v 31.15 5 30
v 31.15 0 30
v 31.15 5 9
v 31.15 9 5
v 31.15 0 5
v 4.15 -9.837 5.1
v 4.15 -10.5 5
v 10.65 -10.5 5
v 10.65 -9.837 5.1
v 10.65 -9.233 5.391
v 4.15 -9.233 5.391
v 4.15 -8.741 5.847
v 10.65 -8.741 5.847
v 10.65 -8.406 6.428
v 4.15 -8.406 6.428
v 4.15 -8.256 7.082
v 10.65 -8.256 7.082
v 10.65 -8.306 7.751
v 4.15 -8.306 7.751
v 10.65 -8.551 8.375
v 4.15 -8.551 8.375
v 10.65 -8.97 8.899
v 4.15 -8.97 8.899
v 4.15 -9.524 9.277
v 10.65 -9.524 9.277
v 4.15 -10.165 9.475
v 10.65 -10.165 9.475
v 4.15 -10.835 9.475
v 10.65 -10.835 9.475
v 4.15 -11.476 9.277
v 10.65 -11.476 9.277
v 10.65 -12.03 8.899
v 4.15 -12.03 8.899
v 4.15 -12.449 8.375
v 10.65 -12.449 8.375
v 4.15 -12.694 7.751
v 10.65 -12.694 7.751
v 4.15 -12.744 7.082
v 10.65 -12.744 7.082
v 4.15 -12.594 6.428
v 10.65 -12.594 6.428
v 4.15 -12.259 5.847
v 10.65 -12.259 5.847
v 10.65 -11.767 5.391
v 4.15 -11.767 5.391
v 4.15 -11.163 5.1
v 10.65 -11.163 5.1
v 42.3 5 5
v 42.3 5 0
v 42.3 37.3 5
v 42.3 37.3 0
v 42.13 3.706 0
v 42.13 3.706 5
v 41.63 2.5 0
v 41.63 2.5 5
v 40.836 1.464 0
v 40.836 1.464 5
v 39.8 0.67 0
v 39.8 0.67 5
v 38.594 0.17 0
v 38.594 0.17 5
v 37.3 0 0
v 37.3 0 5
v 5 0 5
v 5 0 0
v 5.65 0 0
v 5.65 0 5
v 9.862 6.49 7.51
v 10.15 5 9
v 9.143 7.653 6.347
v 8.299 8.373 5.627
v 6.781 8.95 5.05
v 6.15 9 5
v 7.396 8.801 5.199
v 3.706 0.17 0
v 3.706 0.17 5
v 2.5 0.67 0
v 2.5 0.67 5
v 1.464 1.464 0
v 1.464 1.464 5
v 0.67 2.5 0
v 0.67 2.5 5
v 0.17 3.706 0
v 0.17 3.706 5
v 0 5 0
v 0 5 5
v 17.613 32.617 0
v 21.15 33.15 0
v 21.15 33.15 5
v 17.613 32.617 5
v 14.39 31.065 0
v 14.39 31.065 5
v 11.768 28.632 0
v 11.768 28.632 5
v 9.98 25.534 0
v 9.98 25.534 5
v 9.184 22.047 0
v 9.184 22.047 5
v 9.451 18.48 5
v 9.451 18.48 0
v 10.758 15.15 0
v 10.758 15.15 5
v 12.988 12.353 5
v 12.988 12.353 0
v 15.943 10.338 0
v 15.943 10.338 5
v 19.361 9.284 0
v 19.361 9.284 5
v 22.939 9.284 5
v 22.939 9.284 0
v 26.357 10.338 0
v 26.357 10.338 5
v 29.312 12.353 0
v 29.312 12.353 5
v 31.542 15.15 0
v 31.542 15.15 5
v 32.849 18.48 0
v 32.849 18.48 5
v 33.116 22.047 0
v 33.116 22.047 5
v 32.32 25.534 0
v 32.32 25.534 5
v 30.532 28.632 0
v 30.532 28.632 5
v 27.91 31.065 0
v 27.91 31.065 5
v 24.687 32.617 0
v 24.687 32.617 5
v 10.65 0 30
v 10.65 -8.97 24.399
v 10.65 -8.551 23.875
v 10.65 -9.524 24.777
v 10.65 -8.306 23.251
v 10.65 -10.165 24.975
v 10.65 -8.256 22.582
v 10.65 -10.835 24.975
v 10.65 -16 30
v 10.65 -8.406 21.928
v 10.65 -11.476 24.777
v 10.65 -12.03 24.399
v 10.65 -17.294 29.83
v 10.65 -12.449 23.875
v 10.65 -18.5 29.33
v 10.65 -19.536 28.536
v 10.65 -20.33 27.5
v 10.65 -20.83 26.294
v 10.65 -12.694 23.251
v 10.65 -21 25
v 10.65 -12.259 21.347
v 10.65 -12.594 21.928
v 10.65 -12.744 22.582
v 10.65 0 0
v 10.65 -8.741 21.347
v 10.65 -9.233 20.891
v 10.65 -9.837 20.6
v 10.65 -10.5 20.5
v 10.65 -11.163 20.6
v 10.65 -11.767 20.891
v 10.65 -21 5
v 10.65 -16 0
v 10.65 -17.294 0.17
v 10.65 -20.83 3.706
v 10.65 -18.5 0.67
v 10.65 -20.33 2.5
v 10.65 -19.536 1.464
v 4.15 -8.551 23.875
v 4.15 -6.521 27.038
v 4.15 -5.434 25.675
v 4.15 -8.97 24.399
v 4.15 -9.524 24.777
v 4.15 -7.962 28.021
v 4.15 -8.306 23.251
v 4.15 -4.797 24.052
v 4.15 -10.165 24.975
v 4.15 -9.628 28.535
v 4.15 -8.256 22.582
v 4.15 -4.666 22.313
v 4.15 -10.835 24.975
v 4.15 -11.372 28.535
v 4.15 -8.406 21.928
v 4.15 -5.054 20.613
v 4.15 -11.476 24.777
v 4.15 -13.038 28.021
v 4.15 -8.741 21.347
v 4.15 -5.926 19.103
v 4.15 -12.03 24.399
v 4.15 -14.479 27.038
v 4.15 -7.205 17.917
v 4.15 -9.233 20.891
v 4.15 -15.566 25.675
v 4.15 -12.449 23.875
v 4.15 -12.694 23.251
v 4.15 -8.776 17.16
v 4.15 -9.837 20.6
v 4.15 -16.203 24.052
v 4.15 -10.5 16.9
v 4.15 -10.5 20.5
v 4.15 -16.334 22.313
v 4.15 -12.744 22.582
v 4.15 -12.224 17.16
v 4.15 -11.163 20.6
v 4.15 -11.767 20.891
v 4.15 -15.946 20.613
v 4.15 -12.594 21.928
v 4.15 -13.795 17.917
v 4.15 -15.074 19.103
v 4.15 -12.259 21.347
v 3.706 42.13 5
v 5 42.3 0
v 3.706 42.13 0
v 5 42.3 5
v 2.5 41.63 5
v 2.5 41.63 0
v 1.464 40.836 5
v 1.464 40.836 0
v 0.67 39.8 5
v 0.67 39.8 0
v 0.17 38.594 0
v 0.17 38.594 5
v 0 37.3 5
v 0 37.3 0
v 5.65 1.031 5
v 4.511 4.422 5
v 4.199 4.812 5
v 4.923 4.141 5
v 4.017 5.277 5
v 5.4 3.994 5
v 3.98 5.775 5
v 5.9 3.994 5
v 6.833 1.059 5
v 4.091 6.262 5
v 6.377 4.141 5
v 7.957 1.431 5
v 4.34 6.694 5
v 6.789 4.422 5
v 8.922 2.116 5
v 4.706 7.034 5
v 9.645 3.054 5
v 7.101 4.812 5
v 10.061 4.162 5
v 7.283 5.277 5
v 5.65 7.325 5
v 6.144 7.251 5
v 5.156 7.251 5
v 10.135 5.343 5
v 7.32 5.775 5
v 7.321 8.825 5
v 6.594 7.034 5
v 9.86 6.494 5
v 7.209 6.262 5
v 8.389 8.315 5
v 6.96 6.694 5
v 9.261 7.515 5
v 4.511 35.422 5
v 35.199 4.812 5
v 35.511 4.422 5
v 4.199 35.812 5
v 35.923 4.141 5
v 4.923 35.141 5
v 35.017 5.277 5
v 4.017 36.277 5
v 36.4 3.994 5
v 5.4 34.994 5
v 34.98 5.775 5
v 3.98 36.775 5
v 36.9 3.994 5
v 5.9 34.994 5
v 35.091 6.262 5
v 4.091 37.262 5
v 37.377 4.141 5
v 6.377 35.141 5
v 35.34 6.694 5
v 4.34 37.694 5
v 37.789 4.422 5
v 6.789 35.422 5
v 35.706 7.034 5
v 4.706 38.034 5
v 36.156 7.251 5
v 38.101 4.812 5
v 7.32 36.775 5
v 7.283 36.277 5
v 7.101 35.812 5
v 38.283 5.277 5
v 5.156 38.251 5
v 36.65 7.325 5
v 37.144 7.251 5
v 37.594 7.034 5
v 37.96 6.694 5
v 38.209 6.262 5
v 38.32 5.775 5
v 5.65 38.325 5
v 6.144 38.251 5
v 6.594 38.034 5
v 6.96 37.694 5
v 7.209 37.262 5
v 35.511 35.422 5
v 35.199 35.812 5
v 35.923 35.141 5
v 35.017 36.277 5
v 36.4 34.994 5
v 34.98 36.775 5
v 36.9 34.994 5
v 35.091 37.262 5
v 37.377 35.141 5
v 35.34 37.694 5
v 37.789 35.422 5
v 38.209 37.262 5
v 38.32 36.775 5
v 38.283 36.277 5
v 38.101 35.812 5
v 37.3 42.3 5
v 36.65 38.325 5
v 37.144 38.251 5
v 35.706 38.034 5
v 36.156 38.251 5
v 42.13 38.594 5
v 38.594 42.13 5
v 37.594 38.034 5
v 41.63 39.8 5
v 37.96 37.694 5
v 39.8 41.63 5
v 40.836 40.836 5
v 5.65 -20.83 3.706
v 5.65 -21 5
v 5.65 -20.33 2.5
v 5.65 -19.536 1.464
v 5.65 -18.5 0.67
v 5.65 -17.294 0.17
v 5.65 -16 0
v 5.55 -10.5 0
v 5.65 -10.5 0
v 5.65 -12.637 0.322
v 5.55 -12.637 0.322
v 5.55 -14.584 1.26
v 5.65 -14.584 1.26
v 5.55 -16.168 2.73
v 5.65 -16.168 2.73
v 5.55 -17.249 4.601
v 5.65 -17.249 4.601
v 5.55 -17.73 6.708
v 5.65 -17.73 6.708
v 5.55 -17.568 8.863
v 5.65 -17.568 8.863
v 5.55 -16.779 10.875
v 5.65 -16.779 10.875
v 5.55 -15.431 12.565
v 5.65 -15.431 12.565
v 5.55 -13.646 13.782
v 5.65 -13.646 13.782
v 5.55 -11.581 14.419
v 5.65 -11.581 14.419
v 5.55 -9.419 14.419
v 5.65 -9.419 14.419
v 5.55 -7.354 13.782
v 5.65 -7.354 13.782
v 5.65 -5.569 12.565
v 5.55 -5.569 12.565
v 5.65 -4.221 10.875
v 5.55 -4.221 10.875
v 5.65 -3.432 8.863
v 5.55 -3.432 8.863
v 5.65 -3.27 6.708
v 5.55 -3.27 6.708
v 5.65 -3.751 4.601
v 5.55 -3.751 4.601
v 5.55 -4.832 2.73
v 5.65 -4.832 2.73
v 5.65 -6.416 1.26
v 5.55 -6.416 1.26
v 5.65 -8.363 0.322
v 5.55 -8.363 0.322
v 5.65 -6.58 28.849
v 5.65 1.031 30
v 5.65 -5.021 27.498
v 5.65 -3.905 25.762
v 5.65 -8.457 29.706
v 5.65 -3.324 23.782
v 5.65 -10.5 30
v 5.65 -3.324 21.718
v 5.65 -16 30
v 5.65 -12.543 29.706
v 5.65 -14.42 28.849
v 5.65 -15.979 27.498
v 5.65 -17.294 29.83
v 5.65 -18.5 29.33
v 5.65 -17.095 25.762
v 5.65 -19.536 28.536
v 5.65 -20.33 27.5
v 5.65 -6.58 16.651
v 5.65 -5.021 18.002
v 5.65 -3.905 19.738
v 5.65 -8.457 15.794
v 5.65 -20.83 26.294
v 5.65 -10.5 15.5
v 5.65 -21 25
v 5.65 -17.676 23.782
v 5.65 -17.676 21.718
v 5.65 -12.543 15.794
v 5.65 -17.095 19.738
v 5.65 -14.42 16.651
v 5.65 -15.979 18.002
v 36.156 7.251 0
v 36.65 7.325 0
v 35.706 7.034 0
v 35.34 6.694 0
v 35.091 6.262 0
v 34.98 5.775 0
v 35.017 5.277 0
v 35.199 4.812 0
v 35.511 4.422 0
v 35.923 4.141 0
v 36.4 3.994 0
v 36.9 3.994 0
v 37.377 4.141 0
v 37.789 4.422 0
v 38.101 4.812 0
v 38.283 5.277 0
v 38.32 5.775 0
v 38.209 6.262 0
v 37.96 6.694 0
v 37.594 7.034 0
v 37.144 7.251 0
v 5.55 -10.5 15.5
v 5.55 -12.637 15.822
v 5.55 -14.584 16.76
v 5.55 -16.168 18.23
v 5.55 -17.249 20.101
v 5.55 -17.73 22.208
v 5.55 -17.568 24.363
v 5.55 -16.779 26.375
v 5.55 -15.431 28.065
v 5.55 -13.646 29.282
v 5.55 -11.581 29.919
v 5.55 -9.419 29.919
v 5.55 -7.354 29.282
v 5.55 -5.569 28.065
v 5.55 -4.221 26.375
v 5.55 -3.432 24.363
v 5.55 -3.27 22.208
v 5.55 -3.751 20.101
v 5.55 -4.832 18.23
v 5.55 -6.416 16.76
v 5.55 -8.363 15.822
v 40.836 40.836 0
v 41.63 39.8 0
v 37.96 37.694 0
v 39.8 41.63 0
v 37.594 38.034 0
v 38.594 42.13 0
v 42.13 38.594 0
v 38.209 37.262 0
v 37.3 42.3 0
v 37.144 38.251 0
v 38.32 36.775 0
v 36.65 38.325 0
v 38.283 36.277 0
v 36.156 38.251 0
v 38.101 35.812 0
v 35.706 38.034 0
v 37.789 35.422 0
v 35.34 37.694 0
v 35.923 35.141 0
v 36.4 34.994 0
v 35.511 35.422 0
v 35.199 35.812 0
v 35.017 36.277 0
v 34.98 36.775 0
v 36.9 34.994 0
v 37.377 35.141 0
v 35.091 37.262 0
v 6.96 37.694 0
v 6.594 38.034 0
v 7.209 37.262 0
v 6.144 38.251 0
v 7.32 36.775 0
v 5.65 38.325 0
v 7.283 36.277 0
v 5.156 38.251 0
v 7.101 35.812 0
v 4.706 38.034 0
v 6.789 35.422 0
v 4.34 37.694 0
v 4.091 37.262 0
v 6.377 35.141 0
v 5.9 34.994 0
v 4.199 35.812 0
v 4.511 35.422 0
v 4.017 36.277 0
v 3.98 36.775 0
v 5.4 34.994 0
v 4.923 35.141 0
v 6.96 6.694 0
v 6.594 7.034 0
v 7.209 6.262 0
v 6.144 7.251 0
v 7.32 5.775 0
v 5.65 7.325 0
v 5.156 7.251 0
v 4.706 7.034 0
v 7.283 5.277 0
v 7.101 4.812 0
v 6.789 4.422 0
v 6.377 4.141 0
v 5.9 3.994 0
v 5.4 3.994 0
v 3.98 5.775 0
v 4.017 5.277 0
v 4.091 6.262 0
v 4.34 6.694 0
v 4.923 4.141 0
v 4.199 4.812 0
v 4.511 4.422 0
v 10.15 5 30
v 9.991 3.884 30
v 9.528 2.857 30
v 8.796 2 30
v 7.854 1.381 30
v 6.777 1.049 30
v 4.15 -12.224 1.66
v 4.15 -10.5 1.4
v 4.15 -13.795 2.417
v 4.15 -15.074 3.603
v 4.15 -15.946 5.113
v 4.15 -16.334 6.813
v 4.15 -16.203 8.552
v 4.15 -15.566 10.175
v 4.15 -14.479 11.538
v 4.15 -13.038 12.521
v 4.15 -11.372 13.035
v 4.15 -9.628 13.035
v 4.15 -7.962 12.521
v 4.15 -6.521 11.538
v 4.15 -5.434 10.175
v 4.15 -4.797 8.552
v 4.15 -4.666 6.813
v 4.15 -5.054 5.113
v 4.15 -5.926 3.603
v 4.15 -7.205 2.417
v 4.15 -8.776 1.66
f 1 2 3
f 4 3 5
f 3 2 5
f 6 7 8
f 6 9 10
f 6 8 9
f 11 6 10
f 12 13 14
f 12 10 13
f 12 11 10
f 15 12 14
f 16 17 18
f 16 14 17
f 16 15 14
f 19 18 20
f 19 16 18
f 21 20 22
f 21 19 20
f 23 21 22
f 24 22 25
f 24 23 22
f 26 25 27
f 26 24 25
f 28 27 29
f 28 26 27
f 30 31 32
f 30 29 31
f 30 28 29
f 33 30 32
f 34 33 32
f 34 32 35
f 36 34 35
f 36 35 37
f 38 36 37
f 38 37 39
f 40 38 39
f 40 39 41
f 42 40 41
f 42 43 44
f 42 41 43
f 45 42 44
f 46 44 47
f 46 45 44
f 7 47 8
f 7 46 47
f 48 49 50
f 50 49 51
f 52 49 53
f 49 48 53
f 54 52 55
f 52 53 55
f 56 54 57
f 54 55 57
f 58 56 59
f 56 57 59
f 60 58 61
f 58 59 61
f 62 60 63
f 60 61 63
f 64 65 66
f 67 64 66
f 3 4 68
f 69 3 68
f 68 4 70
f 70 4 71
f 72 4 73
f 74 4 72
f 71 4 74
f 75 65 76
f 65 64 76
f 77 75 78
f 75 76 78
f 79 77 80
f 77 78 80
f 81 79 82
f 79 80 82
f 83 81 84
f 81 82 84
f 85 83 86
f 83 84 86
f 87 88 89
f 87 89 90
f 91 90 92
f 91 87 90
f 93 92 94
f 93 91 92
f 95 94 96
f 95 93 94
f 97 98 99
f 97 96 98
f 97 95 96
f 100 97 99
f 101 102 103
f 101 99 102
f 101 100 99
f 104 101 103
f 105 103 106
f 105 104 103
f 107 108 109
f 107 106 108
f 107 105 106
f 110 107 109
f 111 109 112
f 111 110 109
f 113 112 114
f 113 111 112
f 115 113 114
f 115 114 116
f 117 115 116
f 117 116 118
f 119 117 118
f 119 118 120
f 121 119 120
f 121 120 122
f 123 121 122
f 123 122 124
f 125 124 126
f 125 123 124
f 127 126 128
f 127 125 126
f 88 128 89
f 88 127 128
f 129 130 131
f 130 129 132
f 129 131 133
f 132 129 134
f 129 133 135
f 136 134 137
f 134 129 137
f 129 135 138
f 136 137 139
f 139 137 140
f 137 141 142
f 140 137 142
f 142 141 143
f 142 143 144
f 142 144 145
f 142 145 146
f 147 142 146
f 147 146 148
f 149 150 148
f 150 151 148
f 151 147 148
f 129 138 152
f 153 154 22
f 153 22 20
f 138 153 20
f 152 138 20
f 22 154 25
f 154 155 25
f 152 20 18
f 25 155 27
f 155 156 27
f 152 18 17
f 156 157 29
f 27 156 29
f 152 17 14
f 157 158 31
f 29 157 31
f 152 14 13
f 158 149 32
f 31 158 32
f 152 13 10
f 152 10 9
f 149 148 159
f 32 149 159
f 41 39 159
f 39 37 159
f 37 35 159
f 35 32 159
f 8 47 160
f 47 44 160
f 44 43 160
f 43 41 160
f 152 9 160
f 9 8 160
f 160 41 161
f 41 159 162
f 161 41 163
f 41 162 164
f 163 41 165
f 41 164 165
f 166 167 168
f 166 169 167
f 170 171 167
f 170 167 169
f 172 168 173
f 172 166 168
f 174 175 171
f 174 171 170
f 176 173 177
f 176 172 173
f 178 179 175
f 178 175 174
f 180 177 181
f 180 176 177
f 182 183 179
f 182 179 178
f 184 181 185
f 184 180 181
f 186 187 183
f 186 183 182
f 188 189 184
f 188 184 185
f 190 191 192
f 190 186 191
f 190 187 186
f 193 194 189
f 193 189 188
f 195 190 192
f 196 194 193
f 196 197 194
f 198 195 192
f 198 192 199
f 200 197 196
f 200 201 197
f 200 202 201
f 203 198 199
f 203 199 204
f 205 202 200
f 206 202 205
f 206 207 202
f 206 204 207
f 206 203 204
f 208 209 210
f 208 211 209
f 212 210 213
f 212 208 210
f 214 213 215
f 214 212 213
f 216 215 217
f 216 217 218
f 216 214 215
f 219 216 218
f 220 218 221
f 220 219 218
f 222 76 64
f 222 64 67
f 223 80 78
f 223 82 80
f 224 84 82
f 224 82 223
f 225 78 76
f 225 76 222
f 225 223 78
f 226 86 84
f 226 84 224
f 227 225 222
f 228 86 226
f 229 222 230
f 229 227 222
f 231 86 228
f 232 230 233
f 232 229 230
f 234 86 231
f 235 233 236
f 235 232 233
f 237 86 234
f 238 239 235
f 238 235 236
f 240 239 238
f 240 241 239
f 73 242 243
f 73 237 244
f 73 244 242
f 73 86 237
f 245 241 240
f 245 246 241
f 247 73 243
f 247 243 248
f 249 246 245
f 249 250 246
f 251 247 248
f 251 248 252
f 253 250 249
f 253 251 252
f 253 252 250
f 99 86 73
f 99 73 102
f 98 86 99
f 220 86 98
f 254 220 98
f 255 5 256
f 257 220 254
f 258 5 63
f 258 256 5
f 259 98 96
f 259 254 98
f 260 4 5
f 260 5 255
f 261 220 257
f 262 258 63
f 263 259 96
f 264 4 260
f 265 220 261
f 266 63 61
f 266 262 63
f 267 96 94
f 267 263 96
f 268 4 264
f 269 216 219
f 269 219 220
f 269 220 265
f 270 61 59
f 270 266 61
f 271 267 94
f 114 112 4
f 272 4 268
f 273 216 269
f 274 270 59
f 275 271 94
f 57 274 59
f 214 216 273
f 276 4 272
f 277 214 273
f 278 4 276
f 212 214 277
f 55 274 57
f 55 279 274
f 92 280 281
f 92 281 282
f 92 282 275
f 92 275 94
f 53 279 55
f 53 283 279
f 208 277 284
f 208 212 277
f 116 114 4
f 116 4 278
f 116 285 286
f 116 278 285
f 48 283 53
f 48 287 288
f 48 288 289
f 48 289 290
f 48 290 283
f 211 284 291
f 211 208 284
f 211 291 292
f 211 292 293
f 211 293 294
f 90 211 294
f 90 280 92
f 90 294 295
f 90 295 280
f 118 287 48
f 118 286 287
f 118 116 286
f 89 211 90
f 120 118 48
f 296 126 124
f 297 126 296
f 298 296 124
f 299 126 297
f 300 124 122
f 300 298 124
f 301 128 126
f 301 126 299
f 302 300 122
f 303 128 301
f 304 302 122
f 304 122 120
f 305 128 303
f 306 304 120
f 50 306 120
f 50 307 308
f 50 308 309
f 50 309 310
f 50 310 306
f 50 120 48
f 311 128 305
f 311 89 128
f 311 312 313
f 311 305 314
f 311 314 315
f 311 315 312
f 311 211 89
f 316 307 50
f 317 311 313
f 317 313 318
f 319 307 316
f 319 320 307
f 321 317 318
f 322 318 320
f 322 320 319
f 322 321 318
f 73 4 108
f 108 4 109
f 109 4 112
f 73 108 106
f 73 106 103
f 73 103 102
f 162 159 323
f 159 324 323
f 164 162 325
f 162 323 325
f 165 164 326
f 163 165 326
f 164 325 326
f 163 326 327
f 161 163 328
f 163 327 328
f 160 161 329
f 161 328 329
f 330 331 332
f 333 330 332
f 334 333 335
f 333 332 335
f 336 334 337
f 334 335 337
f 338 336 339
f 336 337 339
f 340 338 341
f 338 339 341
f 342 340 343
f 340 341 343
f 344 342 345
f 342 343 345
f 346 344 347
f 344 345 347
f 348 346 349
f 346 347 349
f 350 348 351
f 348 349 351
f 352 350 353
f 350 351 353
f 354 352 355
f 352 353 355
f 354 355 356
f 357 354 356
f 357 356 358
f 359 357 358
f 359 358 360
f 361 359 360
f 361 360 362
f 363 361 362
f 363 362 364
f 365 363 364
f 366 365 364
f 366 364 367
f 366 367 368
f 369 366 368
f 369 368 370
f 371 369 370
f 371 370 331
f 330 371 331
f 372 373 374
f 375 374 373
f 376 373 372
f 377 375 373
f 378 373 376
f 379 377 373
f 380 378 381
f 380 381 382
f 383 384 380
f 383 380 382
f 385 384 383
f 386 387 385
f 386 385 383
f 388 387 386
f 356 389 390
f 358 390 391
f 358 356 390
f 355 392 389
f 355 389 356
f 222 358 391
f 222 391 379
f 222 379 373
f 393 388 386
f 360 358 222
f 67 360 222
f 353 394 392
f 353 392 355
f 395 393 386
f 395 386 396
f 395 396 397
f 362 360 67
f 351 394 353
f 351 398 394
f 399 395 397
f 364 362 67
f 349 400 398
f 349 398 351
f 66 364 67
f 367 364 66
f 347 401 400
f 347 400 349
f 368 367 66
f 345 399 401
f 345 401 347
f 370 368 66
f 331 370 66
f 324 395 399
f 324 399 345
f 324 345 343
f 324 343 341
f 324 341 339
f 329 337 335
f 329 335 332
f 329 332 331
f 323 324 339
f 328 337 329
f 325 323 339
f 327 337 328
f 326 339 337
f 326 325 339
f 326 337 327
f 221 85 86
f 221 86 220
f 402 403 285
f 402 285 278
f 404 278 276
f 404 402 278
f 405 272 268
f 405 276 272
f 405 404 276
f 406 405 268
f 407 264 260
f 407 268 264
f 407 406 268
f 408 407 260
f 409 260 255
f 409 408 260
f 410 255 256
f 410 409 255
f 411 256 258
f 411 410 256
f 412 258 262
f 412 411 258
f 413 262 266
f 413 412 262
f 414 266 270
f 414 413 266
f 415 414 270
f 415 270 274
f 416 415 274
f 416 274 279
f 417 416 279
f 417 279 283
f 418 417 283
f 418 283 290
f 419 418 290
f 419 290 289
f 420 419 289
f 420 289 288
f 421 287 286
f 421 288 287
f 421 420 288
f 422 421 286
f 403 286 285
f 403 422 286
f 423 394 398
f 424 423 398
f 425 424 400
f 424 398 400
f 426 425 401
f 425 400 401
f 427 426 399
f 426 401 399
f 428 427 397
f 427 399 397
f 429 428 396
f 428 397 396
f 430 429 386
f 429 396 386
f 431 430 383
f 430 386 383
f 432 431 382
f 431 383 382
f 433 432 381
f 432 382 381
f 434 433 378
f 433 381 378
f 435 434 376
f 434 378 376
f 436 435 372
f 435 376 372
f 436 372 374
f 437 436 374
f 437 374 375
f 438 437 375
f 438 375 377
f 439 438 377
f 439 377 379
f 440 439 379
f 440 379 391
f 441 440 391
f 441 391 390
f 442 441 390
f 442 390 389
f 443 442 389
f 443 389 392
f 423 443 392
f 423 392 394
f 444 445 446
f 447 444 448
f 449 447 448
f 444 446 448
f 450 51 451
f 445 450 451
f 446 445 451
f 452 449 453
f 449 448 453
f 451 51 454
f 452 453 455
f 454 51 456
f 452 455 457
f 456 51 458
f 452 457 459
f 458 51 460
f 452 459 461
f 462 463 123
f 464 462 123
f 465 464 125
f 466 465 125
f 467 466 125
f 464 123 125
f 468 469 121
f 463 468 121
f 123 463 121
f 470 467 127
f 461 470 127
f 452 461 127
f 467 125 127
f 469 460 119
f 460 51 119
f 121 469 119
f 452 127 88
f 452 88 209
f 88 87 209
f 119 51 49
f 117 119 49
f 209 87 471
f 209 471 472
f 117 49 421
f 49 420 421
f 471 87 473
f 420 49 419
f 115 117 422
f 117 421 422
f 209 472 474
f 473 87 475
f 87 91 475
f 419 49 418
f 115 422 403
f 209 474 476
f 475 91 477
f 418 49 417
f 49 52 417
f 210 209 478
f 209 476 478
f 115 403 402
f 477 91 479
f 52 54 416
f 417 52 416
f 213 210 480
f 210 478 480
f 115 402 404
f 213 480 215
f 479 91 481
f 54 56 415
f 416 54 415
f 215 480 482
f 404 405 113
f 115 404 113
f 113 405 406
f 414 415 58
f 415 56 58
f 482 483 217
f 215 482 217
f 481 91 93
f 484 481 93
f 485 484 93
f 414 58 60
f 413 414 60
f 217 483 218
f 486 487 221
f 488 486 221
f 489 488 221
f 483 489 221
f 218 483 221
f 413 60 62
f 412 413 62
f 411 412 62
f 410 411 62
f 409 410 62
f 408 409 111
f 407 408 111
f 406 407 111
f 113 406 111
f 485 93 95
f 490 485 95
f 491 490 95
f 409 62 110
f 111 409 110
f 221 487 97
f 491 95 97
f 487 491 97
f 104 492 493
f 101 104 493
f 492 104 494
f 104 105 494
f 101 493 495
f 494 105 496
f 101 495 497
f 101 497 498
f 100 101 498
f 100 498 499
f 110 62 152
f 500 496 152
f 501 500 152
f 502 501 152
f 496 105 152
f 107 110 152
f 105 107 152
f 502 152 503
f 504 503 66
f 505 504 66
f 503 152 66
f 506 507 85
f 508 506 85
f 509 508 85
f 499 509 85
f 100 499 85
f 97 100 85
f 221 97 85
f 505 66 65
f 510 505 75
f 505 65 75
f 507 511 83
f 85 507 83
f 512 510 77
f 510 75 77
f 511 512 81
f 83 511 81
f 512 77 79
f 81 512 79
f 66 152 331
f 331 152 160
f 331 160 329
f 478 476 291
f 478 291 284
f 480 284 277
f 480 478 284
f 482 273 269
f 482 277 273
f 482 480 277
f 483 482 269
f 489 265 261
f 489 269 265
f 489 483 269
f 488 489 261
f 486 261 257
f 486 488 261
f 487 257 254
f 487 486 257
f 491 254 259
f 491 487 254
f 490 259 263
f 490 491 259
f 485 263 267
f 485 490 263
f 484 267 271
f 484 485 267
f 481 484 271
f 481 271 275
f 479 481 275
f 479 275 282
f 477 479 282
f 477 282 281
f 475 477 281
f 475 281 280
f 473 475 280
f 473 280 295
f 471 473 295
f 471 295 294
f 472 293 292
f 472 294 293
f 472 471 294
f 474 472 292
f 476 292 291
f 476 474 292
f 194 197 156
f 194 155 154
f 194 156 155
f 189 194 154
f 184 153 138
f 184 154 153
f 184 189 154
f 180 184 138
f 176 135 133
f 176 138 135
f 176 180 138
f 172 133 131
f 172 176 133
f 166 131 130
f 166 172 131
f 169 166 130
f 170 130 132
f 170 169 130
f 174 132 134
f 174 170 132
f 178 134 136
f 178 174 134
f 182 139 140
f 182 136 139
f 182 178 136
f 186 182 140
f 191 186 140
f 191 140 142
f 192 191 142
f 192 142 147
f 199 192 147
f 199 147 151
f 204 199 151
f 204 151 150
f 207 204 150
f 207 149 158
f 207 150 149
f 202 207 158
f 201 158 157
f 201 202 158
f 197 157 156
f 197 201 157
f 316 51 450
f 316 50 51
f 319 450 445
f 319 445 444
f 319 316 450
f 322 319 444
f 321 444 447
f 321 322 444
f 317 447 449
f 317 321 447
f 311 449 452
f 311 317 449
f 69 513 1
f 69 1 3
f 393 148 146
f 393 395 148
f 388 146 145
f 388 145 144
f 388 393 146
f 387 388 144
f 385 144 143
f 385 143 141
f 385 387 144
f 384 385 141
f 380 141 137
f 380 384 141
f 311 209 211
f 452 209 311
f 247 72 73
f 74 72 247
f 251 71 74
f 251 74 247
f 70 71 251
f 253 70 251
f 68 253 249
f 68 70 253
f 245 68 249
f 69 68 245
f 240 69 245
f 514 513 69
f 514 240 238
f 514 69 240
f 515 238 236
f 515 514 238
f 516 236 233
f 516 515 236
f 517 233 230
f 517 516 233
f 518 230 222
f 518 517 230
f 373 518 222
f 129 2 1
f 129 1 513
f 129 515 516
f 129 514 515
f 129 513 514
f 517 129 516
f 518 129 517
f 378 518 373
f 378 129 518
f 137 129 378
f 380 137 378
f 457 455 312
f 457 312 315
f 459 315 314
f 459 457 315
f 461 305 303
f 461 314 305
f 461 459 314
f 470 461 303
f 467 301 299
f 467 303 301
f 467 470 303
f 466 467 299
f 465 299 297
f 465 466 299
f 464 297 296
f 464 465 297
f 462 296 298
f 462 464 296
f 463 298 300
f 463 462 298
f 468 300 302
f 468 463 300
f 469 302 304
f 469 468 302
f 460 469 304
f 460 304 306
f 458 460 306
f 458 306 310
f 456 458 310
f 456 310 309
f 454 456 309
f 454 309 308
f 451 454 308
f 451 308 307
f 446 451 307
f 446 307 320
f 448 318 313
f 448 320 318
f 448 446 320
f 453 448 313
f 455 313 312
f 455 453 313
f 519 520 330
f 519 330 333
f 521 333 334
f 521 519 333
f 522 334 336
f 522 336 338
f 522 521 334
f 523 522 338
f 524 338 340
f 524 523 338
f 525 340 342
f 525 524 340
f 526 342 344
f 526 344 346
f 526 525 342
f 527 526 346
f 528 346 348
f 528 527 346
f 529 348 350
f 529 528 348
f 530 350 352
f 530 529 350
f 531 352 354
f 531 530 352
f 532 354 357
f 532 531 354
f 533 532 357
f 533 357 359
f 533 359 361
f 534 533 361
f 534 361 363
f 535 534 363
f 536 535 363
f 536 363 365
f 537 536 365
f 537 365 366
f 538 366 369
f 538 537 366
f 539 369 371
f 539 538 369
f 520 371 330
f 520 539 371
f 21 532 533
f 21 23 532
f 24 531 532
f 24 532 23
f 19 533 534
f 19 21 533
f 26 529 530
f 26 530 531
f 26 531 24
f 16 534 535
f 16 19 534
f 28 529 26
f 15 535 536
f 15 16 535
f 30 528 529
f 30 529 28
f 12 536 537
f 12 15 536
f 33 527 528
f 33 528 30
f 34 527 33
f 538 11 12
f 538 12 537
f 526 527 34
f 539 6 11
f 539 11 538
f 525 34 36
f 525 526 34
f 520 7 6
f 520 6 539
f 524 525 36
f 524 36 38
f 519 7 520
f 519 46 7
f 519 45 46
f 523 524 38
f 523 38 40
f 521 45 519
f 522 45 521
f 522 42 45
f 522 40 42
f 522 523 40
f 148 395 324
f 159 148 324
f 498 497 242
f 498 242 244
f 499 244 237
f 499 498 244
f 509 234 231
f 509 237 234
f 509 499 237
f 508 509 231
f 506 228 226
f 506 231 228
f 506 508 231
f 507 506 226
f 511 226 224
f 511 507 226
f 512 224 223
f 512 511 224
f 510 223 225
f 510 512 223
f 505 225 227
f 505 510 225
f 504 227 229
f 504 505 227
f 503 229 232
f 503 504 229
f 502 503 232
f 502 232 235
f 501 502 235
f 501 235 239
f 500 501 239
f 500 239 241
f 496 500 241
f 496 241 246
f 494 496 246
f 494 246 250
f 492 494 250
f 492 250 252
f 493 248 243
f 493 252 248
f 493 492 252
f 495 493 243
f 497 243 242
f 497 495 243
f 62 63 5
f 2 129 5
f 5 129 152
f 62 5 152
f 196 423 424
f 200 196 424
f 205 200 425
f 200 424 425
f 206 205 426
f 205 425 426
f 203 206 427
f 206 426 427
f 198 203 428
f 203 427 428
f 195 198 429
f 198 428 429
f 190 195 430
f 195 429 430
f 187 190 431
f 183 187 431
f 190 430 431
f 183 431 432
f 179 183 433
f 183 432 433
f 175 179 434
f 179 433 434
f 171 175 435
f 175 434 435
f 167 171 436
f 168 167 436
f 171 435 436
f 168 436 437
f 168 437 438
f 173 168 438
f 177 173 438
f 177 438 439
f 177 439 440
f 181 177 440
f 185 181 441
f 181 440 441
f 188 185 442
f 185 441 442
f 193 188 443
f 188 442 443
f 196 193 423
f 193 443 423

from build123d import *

# Parameters (mm, degrees)
CUBE003_W                     = 500
CUBE003_H                     = 500
CUBE003_DEPTH                 = 500
CYLINDER006_R                 = 2.25
CYLINDER006_DEPTH             = 1000
CYLINDER005_R                 = 2.25
CYLINDER005_DEPTH             = 1000
CYLINDER004_R                 = 7.25
CYLINDER004_DEPTH             = 6.5
CYLINDER003_R                 = 7.25
CYLINDER003_DEPTH             = 6.5
GROUP003_PLACEMENT_ANGLE      = 180
CYLINDER002_R                 = 7.25
CYLINDER002_DEPTH             = 6.5
CYLINDER001_R                 = 7.25
CYLINDER001_DEPTH             = 6.5
CYLINDER_R                    = 4
CYLINDER_DEPTH                = 200
CUBE002_W                     = 60
CUBE002_H                     = 21
CUBE002_DEPTH                 = 21
CUBE001_W                     = 30
CUBE001_H                     = 31
CUBE001_DEPTH                 = 26
DIFFERENCE002_PITCH_ANGLE     = 90
DIFFERENCE002_PLACEMENT_ANGLE = 90
REFINELINEAREXTRUDE_R         = 12
REFINELINEAREXTRUDE_R_2       = 1.675
LINEAREXTRUDE_DEPTH           = 20
CUBE_W                        = 42.3
CUBE_H                        = 42.3
CUBE_DEPTH                    = 5
CHAMFER_SIZE                  = 4
CHAMFER001_SIZE               = 1.4
CHAMFER002_SIZE               = 1.4
FILLET_R                      = 5
FILLET001_R                   = 5
FILLET002_R                   = 5
FILLET003_R                   = 5
FILLET004_R                   = 5
FILLET005_R                   = 5


with BuildPart() as cube003:
    # cube003 → cube003 (new body)
    with BuildSketch(Plane(origin=(-250, -510, -250), x_dir=(1, 0, 0), z_dir=(0, 0, 1))):
        with Locations((250, 250)):
            Rectangle(CUBE003_W, CUBE003_H)
    extrude(amount=CUBE003_DEPTH)


with BuildPart() as cylinder006:
    # cylinder006 → cylinder006 (new body)
    with BuildSketch(Plane(origin=(15.5, 500, 0), x_dir=(1, 0, 0), z_dir=(0, -1, 0))):
        Circle(CYLINDER006_R)
    extrude(amount=CYLINDER006_DEPTH)


with BuildPart() as union002:
    # cylinder005 → cylinder005 (new body)
    with BuildSketch(Plane.XZ.offset(-500)):
        Circle(CYLINDER005_R)
    extrude(amount=CYLINDER005_DEPTH)

    # Group005: union cylinder006
    add(cylinder006.part)


with BuildPart() as union002_1:
    # Group005 placement: moved
    add(union002.part.moved(Location((2.25, 0, -15.5))))

    # union002: union cube003
    add(cube003.part)


with BuildPart() as cylinder004:
    # cylinder004 → cylinder004 (new body)
    with BuildSketch(Plane(origin=(15.5, 0, 0), x_dir=(1, 0, 0), z_dir=(0, -1, 0))):
        Circle(CYLINDER004_R)
    extrude(amount=CYLINDER004_DEPTH)


with BuildPart() as group003:
    # cylinder003 → cylinder003 (new body)
    with BuildSketch(Plane.XZ):
        Circle(CYLINDER003_R)
    extrude(amount=CYLINDER003_DEPTH)

    # Group003: union cylinder004
    add(cylinder004.part)


with BuildPart() as group003_1:
    # Group003 placement: moved
    add(group003.part.moved(Location((2.25, 10.5, -15.5))).rotate(Axis((2.25, 10.5, -15.5), (1, 0, 0)), GROUP003_PLACEMENT_ANGLE))


with BuildPart() as cylinder002:
    # cylinder002 → cylinder002 (new body)
    with BuildSketch(Plane(origin=(15.5, 0, 0), x_dir=(1, 0, 0), z_dir=(0, -1, 0))):
        Circle(CYLINDER002_R)
    extrude(amount=CYLINDER002_DEPTH)


with BuildPart() as group004:
    # cylinder001 → cylinder001 (new body)
    with BuildSketch(Plane.XZ):
        Circle(CYLINDER001_R)
    extrude(amount=CYLINDER001_DEPTH)

    # Group002: union cylinder002
    add(cylinder002.part)


with BuildPart() as group004_1:
    # Group002 placement: moved
    add(group004.part.moved(Location((2.25, -10.5, -15.5))))

    # Group004: union Group003
    add(group003_1.part)


with BuildPart() as cylinder:
    # cylinder → cylinder (new body)
    with BuildSketch(Plane(origin=(-100, 15, 13), x_dir=(0, 1, 0), z_dir=(1, 0, 0))):
        Circle(CYLINDER_R)
    extrude(amount=CYLINDER_DEPTH)


with BuildPart() as union:
    # cube002 → cube002 (new body)
    with BuildSketch(Plane(origin=(-30, -10.5, -13), x_dir=(1, 0, 0), z_dir=(0, 0, 1))):
        with Locations((30, 10.5)):
            Rectangle(CUBE002_W, CUBE002_H)
    extrude(amount=CUBE002_DEPTH)

    # union: union cylinder
    add(cylinder.part)


with BuildPart() as difference002:
    # cube001 → cube001 (new body)
    with BuildSketch(Plane(origin=(-15, -15.5, -13), x_dir=(1, 0, 0), z_dir=(0, 0, 1))):
        with Locations((15, 15.5)):
            Rectangle(CUBE001_W, CUBE001_H)
    extrude(amount=CUBE001_DEPTH)

    # difference001: cut union
    add(union.part, mode=Mode.SUBTRACT)


with BuildPart() as difference002_1:
    # difference001 placement: moved
    add(difference002.part.moved(Location((10, 0, -13))))

    # union001: union Group004
    add(group004_1.part)

    # difference002: cut union002
    add(union002_1.part, mode=Mode.SUBTRACT)


with BuildPart() as difference002_2:
    # difference002 pitch: moved
    add(difference002_1.part.rotate(Axis((0, 0, 0), (0, 1, 0)), DIFFERENCE002_PITCH_ANGLE))


with BuildPart() as difference002_3:
    # difference002 placement: moved
    add(difference002_2.part.moved(Location((21.15, 5, 25))).rotate(Axis((21.15, 5, 25), (0, 0, 1)), DIFFERENCE002_PLACEMENT_ANGLE))


with BuildPart() as linearextrude:
    # RefineLinearExtrude → LinearExtrude (new body)
    with BuildSketch(Plane(origin=(0, 0, 0), x_dir=(0, 1, 0), z_dir=(0, 0, 1))):
        Circle(REFINELINEAREXTRUDE_R)
        with Locations((15.5, -15.5)):
            Circle(REFINELINEAREXTRUDE_R_2)
        with Locations((15.5, 15.5)):
            Circle(REFINELINEAREXTRUDE_R_2)
        with Locations((-15.5, 15.5)):
            Circle(REFINELINEAREXTRUDE_R_2)
        with Locations((-15.5, -15.5)):
            Circle(REFINELINEAREXTRUDE_R_2)
    extrude(amount=LINEAREXTRUDE_DEPTH)


with BuildPart() as linearextrude_1:
    # LinearExtrude placement: moved
    add(linearextrude.part.moved(Location((21.15, 21.15, -10))))


with BuildPart() as fillet005:
    # cube → cube (new body)
    with BuildSketch(Plane.XY):
        with Locations((21.15, 21.15)):
            Rectangle(CUBE_W, CUBE_H)
    extrude(amount=CUBE_DEPTH)

    # difference: cut LinearExtrude
    add(linearextrude_1.part, mode=Mode.SUBTRACT)

    # Fusion: union difference002
    add(difference002_3.part)

    # Chamfer
    chamfer_edges = [fillet005.edges().sort_by_distance(p)[0] for p in [
        (20.65, 5, 5),
    ]]
    chamfer(chamfer_edges, length=CHAMFER_SIZE)

    # Chamfer001
    chamfer001_edges = [fillet005.edges().sort_by_distance(p)[0] for p in [
        (4.15, -10.5, 30),
    ]]
    chamfer(chamfer001_edges, length=CHAMFER001_SIZE)

    # Chamfer002
    chamfer002_edges = [fillet005.edges().sort_by_distance(p)[0] for p in [
        (4.15, -10.5, 14.5),
    ]]
    chamfer(chamfer002_edges, length=CHAMFER002_SIZE)

    # Fillet
    fillet_edges = [fillet005.edges().sort_by_distance(p)[0] for p in [
        (8.15, -21, 30),
    ]]
    fillet(fillet_edges, radius=FILLET_R)

    # Fillet001
    fillet001_edges = [fillet005.edges().sort_by_distance(p)[0] for p in [
        (8.15, -21, 0),
    ]]
    fillet(fillet001_edges, radius=FILLET001_R)

    # Fillet002
    fillet002_edges = [fillet005.edges().sort_by_distance(p)[0] for p in [
        (0, 0, 2.5),
    ]]
    fillet(fillet002_edges, radius=FILLET002_R)

    # Fillet003
    fillet003_edges = [fillet005.edges().sort_by_distance(p)[0] for p in [
        (42.3, 0, 2.5),
    ]]
    fillet(fillet003_edges, radius=FILLET003_R)

    # Fillet004
    fillet004_edges = [fillet005.edges().sort_by_distance(p)[0] for p in [
        (42.3, 42.3, 2.5),
    ]]
    fillet(fillet004_edges, radius=FILLET004_R)

    # Fillet005
    fillet005_edges = [fillet005.edges().sort_by_distance(p)[0] for p in [
        (0, 42.3, 2.5),
    ]]
    fillet(fillet005_edges, radius=FILLET005_R)


solid = fillet005.part
